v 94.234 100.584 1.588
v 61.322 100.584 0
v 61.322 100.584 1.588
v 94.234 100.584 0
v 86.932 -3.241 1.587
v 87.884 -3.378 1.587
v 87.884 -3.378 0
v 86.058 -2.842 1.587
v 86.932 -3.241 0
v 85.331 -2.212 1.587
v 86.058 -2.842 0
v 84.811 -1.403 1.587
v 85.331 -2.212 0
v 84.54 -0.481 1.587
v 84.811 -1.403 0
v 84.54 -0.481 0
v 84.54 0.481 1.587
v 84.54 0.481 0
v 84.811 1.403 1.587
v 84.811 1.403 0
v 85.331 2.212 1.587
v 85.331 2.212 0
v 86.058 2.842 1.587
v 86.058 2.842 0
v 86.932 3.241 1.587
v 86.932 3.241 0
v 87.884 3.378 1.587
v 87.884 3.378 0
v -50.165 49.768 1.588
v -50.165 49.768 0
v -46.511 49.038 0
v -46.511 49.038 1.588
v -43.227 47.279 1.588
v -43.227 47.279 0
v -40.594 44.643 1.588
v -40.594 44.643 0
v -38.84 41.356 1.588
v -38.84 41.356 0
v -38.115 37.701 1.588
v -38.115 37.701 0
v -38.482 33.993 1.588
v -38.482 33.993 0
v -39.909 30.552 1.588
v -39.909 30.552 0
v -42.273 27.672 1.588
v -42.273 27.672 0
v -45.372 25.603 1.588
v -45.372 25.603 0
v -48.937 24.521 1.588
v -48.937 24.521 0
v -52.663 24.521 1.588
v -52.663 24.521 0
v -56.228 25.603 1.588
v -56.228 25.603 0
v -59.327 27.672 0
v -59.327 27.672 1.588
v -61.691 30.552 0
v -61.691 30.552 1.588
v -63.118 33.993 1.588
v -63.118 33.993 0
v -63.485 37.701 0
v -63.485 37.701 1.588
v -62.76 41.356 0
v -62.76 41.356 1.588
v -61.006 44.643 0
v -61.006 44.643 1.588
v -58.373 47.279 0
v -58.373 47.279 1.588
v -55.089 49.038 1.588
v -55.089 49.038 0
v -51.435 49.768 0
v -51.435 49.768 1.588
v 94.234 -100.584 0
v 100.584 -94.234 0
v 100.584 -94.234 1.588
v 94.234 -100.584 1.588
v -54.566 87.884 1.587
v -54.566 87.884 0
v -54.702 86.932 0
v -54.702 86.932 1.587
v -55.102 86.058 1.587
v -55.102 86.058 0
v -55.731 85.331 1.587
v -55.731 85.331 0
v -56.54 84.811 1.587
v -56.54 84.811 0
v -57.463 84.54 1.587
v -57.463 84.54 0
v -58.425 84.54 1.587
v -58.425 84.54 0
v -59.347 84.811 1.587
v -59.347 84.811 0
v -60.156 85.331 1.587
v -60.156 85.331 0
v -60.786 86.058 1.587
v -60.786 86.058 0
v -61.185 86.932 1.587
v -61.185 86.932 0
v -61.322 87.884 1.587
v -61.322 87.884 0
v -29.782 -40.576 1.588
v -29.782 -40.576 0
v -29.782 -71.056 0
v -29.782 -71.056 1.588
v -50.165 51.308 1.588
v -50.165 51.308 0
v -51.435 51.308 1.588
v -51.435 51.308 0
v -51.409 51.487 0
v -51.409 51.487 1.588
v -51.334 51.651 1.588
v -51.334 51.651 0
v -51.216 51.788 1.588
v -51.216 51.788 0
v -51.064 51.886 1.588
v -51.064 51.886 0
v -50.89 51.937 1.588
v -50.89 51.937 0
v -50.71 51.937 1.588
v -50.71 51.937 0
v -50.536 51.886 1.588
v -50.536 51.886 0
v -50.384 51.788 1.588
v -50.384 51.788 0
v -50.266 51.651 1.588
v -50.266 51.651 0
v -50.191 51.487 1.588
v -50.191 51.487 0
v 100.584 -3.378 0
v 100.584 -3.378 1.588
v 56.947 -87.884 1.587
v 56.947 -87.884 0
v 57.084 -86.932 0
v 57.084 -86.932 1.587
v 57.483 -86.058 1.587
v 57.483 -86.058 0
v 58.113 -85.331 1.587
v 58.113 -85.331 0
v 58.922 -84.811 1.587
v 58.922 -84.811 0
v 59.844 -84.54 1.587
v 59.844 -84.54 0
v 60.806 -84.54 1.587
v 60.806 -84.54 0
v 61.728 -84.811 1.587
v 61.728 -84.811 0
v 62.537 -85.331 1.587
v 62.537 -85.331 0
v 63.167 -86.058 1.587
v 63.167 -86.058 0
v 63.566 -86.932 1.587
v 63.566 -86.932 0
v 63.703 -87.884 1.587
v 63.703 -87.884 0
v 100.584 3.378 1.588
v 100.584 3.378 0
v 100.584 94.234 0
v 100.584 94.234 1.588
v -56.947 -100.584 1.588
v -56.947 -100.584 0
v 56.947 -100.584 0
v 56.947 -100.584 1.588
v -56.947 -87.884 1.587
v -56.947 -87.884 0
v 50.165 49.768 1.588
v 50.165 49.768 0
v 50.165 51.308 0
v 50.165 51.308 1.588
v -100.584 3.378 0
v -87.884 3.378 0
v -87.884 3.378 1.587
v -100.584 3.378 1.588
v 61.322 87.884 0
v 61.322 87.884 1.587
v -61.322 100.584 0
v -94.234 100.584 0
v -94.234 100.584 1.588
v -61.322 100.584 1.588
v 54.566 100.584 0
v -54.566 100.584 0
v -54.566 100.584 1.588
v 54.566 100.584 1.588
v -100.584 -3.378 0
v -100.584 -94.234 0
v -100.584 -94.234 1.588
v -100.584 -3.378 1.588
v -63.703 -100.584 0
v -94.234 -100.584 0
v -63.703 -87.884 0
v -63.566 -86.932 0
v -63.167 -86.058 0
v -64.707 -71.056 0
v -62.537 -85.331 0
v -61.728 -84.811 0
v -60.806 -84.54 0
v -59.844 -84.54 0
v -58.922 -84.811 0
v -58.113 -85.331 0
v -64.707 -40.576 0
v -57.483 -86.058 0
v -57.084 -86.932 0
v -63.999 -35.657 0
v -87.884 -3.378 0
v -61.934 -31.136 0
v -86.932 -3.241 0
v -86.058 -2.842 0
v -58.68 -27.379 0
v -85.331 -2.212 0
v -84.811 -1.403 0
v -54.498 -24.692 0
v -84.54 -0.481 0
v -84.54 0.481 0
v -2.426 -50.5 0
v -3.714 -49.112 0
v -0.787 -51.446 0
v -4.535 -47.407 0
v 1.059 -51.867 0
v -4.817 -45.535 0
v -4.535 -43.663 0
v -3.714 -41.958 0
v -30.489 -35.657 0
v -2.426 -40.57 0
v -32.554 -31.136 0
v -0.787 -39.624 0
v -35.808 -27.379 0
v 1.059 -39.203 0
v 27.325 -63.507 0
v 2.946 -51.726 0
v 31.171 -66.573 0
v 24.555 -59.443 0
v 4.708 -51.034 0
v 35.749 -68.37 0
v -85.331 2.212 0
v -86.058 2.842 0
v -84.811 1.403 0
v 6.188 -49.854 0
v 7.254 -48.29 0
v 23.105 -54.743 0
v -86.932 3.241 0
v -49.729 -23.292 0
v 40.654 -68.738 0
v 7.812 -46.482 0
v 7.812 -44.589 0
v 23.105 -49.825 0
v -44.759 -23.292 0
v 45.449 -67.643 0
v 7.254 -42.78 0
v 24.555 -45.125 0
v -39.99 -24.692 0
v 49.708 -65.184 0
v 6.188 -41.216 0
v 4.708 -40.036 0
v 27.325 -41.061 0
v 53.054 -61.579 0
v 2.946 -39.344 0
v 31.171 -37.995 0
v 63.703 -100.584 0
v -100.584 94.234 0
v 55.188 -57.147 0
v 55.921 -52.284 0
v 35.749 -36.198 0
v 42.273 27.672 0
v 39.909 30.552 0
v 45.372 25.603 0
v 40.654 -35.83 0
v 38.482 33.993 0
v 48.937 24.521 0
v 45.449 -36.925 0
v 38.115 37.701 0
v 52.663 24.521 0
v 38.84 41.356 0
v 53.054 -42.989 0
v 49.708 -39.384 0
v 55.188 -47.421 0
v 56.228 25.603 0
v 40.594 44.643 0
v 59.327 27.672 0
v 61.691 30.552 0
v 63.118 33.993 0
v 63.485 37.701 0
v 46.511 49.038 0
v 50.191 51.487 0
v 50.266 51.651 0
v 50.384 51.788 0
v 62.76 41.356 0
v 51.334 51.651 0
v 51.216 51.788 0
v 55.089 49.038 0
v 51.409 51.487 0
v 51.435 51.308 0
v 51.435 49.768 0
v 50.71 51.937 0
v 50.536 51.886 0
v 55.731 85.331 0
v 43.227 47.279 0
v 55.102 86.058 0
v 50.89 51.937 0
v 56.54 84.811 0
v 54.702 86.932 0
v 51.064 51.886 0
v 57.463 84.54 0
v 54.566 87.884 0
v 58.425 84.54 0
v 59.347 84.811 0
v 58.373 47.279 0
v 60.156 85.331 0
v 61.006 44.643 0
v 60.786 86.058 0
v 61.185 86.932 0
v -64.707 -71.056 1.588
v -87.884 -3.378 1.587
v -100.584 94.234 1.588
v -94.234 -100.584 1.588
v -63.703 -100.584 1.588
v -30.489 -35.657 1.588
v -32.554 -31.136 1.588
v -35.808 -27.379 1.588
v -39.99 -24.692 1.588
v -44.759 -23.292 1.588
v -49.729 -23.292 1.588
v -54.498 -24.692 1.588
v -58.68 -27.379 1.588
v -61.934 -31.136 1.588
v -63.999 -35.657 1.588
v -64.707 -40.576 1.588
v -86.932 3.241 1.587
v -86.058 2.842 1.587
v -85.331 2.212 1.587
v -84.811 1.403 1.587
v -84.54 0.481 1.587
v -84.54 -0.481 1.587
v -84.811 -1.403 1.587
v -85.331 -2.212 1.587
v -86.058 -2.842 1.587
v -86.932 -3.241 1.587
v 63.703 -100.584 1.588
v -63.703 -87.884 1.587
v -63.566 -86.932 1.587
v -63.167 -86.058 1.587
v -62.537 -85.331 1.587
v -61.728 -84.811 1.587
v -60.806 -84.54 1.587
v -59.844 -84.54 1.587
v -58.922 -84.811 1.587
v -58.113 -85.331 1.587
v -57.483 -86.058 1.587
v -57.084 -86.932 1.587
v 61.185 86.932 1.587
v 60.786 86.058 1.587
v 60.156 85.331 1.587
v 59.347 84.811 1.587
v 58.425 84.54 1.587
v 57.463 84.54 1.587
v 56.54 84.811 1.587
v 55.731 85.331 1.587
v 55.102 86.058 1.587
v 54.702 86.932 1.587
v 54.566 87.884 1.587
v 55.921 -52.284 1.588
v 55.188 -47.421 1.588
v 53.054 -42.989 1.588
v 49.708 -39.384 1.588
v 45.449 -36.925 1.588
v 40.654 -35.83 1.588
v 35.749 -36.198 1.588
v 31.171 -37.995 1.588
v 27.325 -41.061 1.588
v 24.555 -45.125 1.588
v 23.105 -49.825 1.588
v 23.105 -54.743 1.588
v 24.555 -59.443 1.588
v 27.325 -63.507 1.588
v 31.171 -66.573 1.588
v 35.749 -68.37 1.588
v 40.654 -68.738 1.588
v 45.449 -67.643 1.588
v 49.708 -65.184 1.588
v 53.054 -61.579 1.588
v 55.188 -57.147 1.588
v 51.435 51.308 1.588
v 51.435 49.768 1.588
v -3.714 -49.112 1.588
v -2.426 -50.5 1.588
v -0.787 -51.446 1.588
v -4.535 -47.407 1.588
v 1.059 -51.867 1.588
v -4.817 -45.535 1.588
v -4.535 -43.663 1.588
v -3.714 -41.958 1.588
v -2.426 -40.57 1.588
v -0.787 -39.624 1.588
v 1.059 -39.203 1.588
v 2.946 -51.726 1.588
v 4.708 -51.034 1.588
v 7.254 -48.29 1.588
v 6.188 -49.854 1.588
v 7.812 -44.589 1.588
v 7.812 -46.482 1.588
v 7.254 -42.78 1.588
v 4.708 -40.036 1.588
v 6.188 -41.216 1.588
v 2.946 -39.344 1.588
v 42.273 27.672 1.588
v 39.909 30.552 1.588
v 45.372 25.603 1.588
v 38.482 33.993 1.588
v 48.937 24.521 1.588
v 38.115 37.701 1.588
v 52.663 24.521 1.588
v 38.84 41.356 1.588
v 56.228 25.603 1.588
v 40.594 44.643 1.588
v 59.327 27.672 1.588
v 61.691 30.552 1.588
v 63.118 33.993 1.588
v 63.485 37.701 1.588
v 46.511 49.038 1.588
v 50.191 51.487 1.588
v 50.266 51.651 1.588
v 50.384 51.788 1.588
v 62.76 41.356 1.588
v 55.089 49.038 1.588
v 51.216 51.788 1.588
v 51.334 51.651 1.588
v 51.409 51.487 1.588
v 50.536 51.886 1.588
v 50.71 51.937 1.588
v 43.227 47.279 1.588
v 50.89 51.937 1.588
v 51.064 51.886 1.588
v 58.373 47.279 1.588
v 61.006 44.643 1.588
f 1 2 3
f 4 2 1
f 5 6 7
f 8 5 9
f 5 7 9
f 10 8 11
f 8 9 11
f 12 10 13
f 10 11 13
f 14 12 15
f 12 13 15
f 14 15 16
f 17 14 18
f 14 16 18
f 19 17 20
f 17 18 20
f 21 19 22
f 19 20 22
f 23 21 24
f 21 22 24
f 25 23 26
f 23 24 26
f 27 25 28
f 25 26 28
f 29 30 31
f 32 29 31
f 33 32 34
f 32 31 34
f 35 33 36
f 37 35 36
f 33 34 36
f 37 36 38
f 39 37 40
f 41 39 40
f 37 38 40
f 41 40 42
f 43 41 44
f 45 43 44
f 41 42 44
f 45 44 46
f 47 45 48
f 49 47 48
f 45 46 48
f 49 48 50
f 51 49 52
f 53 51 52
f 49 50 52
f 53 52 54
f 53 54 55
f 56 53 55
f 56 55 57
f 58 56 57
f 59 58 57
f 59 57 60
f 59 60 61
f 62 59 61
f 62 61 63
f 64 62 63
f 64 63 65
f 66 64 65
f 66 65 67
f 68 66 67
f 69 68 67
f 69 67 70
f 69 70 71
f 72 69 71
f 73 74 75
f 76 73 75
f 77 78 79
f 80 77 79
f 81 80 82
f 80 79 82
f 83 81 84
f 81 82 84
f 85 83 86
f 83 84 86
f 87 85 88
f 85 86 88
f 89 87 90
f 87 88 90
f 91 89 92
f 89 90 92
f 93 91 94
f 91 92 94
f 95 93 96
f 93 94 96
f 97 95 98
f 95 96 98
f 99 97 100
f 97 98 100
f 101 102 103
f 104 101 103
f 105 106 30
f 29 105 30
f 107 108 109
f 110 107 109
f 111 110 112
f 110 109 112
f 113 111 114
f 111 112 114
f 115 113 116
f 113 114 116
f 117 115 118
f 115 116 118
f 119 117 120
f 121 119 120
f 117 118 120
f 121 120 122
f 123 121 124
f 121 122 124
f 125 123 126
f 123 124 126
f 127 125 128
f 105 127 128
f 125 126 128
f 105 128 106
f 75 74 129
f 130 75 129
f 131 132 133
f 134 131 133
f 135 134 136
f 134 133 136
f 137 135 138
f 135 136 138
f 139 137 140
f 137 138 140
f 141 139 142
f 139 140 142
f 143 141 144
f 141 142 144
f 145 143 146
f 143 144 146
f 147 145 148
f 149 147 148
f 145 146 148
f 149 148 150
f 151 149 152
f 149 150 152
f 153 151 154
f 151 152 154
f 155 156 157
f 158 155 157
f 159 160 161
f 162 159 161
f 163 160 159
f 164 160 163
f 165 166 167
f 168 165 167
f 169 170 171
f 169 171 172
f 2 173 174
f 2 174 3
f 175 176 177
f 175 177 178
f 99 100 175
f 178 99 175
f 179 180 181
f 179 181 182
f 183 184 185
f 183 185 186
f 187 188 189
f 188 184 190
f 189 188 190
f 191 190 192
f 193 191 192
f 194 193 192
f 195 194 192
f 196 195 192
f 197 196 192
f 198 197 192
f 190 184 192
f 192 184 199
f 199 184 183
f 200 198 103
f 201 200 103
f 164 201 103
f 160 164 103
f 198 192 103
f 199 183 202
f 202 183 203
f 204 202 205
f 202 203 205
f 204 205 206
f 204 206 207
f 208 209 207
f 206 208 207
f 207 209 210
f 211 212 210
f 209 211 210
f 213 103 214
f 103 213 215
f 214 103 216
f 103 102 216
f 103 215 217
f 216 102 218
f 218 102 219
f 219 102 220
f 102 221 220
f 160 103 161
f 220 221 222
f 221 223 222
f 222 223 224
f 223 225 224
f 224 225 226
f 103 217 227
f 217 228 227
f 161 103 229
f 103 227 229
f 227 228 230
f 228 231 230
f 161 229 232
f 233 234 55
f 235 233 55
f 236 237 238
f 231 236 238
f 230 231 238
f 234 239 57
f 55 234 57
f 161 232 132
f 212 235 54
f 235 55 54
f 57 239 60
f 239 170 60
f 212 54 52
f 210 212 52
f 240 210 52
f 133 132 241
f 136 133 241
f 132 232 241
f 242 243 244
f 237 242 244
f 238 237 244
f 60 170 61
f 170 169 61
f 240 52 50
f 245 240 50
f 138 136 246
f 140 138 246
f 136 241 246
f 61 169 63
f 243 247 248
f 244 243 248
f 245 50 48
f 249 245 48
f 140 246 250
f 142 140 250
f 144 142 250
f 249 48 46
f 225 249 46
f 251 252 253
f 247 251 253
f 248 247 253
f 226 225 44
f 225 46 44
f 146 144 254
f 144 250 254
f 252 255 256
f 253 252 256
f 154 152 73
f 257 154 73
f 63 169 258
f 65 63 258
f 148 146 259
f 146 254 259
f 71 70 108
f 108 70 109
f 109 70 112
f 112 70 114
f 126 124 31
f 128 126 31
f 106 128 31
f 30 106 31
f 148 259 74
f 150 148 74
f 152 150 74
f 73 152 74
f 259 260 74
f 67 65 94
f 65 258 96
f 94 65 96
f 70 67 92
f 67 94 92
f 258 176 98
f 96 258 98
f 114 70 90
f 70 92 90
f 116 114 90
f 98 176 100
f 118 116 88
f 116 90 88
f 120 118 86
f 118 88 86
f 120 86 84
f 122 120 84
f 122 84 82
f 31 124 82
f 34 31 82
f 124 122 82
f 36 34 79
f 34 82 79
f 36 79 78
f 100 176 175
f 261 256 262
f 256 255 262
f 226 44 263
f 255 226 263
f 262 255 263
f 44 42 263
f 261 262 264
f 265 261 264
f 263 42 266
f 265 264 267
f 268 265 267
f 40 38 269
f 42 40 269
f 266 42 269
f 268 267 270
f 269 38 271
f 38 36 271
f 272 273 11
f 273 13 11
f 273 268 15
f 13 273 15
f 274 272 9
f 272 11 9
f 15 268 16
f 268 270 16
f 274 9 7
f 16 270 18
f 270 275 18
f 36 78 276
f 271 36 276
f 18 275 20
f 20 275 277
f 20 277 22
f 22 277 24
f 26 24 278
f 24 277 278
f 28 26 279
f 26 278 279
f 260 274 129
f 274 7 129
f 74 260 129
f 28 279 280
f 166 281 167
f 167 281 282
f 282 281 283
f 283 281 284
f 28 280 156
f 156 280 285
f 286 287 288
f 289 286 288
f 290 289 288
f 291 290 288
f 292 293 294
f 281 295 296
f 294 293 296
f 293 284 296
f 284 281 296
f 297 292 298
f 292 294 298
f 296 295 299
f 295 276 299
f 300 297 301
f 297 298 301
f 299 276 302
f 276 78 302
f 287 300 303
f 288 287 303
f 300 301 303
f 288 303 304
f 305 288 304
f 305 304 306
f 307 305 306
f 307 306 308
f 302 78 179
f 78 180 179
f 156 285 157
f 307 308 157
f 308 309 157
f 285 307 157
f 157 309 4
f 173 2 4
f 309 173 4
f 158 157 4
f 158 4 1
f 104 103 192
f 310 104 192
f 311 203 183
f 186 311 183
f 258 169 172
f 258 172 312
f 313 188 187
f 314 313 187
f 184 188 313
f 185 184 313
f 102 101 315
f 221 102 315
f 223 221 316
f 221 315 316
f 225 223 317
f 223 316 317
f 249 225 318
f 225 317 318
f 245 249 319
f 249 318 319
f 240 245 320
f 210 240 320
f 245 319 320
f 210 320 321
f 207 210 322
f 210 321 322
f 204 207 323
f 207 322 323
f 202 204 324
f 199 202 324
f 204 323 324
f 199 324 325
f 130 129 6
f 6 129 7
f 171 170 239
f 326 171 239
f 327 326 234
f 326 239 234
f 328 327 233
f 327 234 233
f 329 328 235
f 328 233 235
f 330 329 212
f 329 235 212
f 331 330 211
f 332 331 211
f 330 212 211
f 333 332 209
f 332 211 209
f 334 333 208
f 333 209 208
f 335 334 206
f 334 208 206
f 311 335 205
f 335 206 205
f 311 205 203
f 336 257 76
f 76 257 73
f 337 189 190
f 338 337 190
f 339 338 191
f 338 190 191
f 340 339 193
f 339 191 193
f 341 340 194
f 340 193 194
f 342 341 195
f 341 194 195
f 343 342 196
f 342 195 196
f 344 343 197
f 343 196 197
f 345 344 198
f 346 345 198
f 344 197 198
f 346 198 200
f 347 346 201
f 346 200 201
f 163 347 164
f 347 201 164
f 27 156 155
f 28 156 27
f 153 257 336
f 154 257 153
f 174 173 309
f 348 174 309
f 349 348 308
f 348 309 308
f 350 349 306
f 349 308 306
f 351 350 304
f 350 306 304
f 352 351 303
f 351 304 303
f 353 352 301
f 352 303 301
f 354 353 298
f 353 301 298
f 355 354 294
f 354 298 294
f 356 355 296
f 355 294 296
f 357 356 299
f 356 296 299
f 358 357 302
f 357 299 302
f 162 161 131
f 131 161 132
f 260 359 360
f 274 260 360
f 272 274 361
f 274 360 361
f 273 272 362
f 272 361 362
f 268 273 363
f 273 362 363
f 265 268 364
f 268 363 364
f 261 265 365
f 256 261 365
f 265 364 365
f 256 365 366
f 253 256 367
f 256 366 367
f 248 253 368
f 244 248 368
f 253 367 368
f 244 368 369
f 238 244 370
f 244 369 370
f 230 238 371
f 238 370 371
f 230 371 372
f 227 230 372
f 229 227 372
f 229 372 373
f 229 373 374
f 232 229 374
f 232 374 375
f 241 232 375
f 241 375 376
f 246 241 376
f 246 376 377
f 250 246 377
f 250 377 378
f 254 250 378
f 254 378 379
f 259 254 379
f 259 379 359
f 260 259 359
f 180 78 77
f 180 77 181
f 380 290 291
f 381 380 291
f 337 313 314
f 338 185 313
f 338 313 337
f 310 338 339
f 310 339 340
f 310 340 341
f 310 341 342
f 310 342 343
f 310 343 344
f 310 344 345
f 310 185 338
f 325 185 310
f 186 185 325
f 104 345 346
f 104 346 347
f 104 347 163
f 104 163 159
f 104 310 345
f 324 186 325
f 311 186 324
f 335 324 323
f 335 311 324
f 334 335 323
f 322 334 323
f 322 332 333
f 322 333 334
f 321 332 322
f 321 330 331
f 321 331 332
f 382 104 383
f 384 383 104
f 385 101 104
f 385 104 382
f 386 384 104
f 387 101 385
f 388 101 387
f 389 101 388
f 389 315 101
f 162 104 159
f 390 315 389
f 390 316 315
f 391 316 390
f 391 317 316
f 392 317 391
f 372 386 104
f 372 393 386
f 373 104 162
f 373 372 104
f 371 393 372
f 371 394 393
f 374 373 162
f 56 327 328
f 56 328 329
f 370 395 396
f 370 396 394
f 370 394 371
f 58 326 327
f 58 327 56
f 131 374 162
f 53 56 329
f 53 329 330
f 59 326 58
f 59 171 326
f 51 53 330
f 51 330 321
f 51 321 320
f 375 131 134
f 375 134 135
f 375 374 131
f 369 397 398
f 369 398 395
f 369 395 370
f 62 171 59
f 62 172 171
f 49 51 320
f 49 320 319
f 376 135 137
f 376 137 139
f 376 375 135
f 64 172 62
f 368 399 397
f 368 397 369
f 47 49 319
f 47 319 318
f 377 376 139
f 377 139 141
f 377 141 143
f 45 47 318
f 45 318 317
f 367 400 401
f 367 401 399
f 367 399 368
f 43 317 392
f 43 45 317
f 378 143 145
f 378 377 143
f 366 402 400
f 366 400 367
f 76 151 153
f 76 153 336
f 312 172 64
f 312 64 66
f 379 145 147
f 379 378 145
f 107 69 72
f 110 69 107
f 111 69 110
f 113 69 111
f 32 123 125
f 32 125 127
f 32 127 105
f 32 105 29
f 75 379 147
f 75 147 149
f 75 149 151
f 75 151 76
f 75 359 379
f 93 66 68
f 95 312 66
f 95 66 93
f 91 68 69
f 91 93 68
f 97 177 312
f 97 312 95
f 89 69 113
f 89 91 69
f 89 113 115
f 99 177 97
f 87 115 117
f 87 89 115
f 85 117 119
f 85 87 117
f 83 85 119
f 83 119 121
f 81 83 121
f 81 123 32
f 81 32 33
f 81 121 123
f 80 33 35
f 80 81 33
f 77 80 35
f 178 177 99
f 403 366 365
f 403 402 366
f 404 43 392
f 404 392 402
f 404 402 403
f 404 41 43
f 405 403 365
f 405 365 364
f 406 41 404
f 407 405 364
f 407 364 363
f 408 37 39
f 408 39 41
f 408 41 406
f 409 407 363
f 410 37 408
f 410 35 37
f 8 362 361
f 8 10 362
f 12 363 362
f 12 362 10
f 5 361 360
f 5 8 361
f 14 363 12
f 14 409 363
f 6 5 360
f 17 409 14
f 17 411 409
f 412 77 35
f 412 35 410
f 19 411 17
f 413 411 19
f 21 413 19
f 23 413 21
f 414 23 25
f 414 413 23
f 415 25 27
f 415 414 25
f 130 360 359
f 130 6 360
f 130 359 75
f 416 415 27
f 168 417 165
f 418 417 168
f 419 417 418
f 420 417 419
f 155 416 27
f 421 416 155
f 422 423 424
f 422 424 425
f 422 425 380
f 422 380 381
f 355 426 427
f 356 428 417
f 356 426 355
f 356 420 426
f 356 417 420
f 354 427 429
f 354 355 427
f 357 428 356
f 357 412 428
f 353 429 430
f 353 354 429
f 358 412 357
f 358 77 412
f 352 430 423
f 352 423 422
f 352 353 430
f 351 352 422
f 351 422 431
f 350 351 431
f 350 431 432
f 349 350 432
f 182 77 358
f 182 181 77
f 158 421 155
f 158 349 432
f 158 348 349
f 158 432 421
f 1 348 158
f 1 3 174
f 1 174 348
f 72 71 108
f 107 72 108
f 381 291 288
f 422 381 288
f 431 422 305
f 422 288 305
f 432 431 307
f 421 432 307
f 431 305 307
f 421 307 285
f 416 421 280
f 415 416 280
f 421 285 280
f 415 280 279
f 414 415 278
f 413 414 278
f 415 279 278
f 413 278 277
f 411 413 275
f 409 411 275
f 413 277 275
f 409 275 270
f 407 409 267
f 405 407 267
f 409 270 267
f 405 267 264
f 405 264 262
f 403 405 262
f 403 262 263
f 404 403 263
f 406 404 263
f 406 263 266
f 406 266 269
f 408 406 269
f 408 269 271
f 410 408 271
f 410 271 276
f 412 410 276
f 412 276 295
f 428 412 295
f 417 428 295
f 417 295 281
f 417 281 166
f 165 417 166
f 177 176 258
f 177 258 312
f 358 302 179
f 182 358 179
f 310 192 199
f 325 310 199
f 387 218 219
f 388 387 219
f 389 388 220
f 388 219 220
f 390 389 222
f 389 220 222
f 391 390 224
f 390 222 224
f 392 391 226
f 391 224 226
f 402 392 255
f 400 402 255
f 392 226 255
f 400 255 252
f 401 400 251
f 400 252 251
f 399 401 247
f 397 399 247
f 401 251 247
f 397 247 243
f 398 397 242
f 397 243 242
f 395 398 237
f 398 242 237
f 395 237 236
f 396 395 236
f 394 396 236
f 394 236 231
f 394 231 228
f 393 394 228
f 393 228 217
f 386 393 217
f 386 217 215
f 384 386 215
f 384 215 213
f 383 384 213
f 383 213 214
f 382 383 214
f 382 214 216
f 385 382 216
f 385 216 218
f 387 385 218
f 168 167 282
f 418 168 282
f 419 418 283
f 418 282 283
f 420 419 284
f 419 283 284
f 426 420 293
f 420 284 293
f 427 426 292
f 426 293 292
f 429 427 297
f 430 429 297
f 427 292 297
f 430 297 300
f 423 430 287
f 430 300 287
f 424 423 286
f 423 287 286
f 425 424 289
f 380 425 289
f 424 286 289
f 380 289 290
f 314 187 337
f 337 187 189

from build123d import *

# Parameters (mm, degrees)
SKETCH1_W                 = 201.168
SKETCH1_H                 = 201.168
BOSS_EXTRUDE1_DEPTH       = 1.5875
CUT_EXTRUDE1_REACH        = 144.256
SKETCH2_R                 = 17.4625
SKETCH2_R_2               = 16.5
F_1_4_CLEARANCE_HOLE1_D   = 6.7564
CHAMFER1_SIZE             = 6.35
CUT_EXTRUDE3_REACH        = 144.256
CUT_EXTRUDE4_REACH        = 144.256
CUT_EXTRUDE5_REACH        = 144.256
SKETCH7_W                 = 6.7564
SKETCH7_H                 = 14.478
SKETCH7_W_2               = 14.478
SKETCH7_H_2               = 6.7564
PORT_FOR_POWER_PLUG_REACH = 144.256
SKETCH8_R                 = 6.35


with BuildPart() as part:
    # Sketch1 → Boss-Extrude1 (new body)
    with BuildSketch(Plane.XY):
        Rectangle(SKETCH1_W, SKETCH1_H)
    extrude(amount=BOSS_EXTRUDE1_DEPTH)

    # Sketch2 → Cut-Extrude1 (cut, up to next)
    with BuildSketch(Plane.XY.offset(1.5875), mode=Mode.PRIVATE) as cut_extrude1_sk1:
        with Locations((-47.244, -40.5765)):
            Circle(SKETCH2_R)
    cut_extrude1_tool1 = extrude(cut_extrude1_sk1.sketch, amount=-CUT_EXTRUDE1_REACH, mode=Mode.PRIVATE) & part.part
    # Sketch2 → Cut-Extrude1 (cut, up to next)
    with BuildSketch(Plane.XY.offset(1.5875), mode=Mode.PRIVATE) as cut_extrude1_sk2:
        with Locations((39.4206, -52.284)):
            Circle(SKETCH2_R_2)
    cut_extrude1_tool2 = extrude(cut_extrude1_sk2.sketch, amount=-CUT_EXTRUDE1_REACH, mode=Mode.PRIVATE) & part.part
    add(cut_extrude1_tool1.solids().sort_by_distance((-47.244, -40.5765, 1.5875))[0], mode=Mode.SUBTRACT)
    add(cut_extrude1_tool2.solids().sort_by_distance((39.4206, -52.284, 1.5875))[0], mode=Mode.SUBTRACT)

    # 1/4 Clearance Hole1 (through all)
    with Locations(Plane.XY.offset(1.5875)):
        with Locations((-57.94375, 87.884), (57.94375, 87.884), (87.884, 0), (-87.884, 0), (-60.325, -87.884), (60.325, -87.884)):
            Hole(F_1_4_CLEARANCE_HOLE1_D / 2)

    # Chamfer1
    chamfer1_edges = [part.edges().sort_by_distance(p)[0] for p in [
        (100.584, -100.584, 0.79375),
        (-100.584, -100.584, 0.79375),
        (-100.584, 100.584, 0.79375),
        (100.584, 100.584, 0.79375),
    ]]
    chamfer(chamfer1_edges, length=CHAMFER1_SIZE)

    # Sketch5 → Cut-Extrude3 (cut, up to next)
    with BuildSketch(Plane(origin=(0, 0, 0), x_dir=(-1, 0, 0), z_dir=(0, 0, -1)), mode=Mode.PRIVATE) as cut_extrude3_sk1:
        with BuildLine():
            Line((29.7815, -40.5765), (29.7815, -71.0565))
            Line((29.7815, -71.0565), (64.7065, -71.0565))
            Line((64.7065, -71.0565), (64.7065, -40.5765))
            ThreePointArc((64.7065, -40.5765), (47.244, -58.039), (29.7815, -40.5765))
        make_face()
    cut_extrude3_tool1 = extrude(cut_extrude3_sk1.sketch, amount=-CUT_EXTRUDE3_REACH, mode=Mode.PRIVATE) & part.part
    add(cut_extrude3_tool1.solids().sort_by_distance((-47.244, -62.220952, 0))[0], mode=Mode.SUBTRACT)

    # Sketch6 → Cut-Extrude4 (cut, up to next)
    with BuildSketch(Plane(origin=(0, 0, 0), x_dir=(-1, 0, 0), z_dir=(0, 0, -1)), mode=Mode.PRIVATE) as cut_extrude4_sk1:
        with BuildLine():
            Line((-50.165, 49.768115066), (-50.165, 51.308))
            ThreePointArc((-50.165, 51.308), (-50.8, 51.943), (-51.435, 51.308))
            Line((-51.435, 51.308), (-51.435, 49.768115066))
            ThreePointArc((-51.435, 49.768115066), (-50.8, 24.384), (-50.165, 49.768115066))
        make_face()
    cut_extrude4_tool1 = extrude(cut_extrude4_sk1.sketch, amount=-CUT_EXTRUDE4_REACH, mode=Mode.PRIVATE) & part.part
    # Sketch6 → Cut-Extrude4 (cut, up to next)
    with BuildSketch(Plane(origin=(0, 0, 0), x_dir=(-1, 0, 0), z_dir=(0, 0, -1)), mode=Mode.PRIVATE) as cut_extrude4_sk2:
        with BuildLine():
            Line((51.435, 49.768115066), (51.435, 51.308))
            ThreePointArc((51.435, 51.308), (50.8, 51.943), (50.165, 51.308))
            Line((50.165, 51.308), (50.165, 49.768115066))
            ThreePointArc((50.165, 49.768115066), (50.8, 24.384), (51.435, 49.768115066))
        make_face()
    cut_extrude4_tool2 = extrude(cut_extrude4_sk2.sketch, amount=-CUT_EXTRUDE4_REACH, mode=Mode.PRIVATE) & part.part
    add(cut_extrude4_tool1.solids().sort_by_distance((50.8, 37.153354, 0))[0], mode=Mode.SUBTRACT)
    add(cut_extrude4_tool2.solids().sort_by_distance((-50.8, 37.153354, 0))[0], mode=Mode.SUBTRACT)

    # Sketch7 → Cut-Extrude5 (cut, up to next)
    with BuildSketch(Plane(origin=(0, 0, 0), x_dir=(-1, 0, 0), z_dir=(0, 0, -1)), mode=Mode.PRIVATE) as cut_extrude5_sk1:
        with Locations((-57.94375, 95.123)):
            Rectangle(SKETCH7_W, SKETCH7_H)
    cut_extrude5_tool1 = extrude(cut_extrude5_sk1.sketch, amount=-CUT_EXTRUDE5_REACH, mode=Mode.PRIVATE) & part.part
    # Sketch7 → Cut-Extrude5 (cut, up to next)
    with BuildSketch(Plane(origin=(0, 0, 0), x_dir=(-1, 0, 0), z_dir=(0, 0, -1)), mode=Mode.PRIVATE) as cut_extrude5_sk2:
        with Locations((57.94375, 95.123)):
            Rectangle(SKETCH7_W, SKETCH7_H)
    cut_extrude5_tool2 = extrude(cut_extrude5_sk2.sketch, amount=-CUT_EXTRUDE5_REACH, mode=Mode.PRIVATE) & part.part
    # Sketch7 → Cut-Extrude5 (cut, up to next)
    with BuildSketch(Plane(origin=(0, 0, 0), x_dir=(-1, 0, 0), z_dir=(0, 0, -1)), mode=Mode.PRIVATE) as cut_extrude5_sk3:
        with Locations((95.123, 0)):
            Rectangle(SKETCH7_W_2, SKETCH7_H_2)
    cut_extrude5_tool3 = extrude(cut_extrude5_sk3.sketch, amount=-CUT_EXTRUDE5_REACH, mode=Mode.PRIVATE) & part.part
    # Sketch7 → Cut-Extrude5 (cut, up to next)
    with BuildSketch(Plane(origin=(0, 0, 0), x_dir=(-1, 0, 0), z_dir=(0, 0, -1)), mode=Mode.PRIVATE) as cut_extrude5_sk4:
        with Locations((60.325, -95.123)):
            Rectangle(SKETCH7_W, SKETCH7_H)
    cut_extrude5_tool4 = extrude(cut_extrude5_sk4.sketch, amount=-CUT_EXTRUDE5_REACH, mode=Mode.PRIVATE) & part.part
    # Sketch7 → Cut-Extrude5 (cut, up to next)
    with BuildSketch(Plane(origin=(0, 0, 0), x_dir=(-1, 0, 0), z_dir=(0, 0, -1)), mode=Mode.PRIVATE) as cut_extrude5_sk5:
        with Locations((-60.325, -95.123)):
            Rectangle(SKETCH7_W, SKETCH7_H)
    cut_extrude5_tool5 = extrude(cut_extrude5_sk5.sketch, amount=-CUT_EXTRUDE5_REACH, mode=Mode.PRIVATE) & part.part
    # Sketch7 → Cut-Extrude5 (cut, up to next)
    with BuildSketch(Plane(origin=(0, 0, 0), x_dir=(-1, 0, 0), z_dir=(0, 0, -1)), mode=Mode.PRIVATE) as cut_extrude5_sk6:
        with Locations((-95.123, 0)):
            Rectangle(SKETCH7_W_2, SKETCH7_H_2)
    cut_extrude5_tool6 = extrude(cut_extrude5_sk6.sketch, amount=-CUT_EXTRUDE5_REACH, mode=Mode.PRIVATE) & part.part
    add(cut_extrude5_tool1.solids().sort_by_distance((57.94375, 95.123, 0))[0], mode=Mode.SUBTRACT)
    add(cut_extrude5_tool2.solids().sort_by_distance((-57.94375, 95.123, 0))[0], mode=Mode.SUBTRACT)
    add(cut_extrude5_tool3.solids().sort_by_distance((-95.123, 0, 0))[0], mode=Mode.SUBTRACT)
    add(cut_extrude5_tool4.solids().sort_by_distance((-60.325, -95.123, 0))[0], mode=Mode.SUBTRACT)
    add(cut_extrude5_tool5.solids().sort_by_distance((60.325, -95.123, 0))[0], mode=Mode.SUBTRACT)
    add(cut_extrude5_tool6.solids().sort_by_distance((95.123, 0, 0))[0], mode=Mode.SUBTRACT)

    # Sketch8 → PORT FOR POWER PLUG (cut, up to next)
    with BuildSketch(Plane(origin=(0, 0, 0), x_dir=(-1, 0, 0), z_dir=(0, 0, -1)), mode=Mode.PRIVATE) as port_for_power_plug_sk1:
        with Locations((-1.533105196, -45.535092969)):
            Circle(SKETCH8_R)
    port_for_power_plug_tool1 = extrude(port_for_power_plug_sk1.sketch, amount=-PORT_FOR_POWER_PLUG_REACH, mode=Mode.PRIVATE) & part.part
    add(port_for_power_plug_tool1.solids().sort_by_distance((1.533105, -45.535093, 0))[0], mode=Mode.SUBTRACT)


solid = part.part
